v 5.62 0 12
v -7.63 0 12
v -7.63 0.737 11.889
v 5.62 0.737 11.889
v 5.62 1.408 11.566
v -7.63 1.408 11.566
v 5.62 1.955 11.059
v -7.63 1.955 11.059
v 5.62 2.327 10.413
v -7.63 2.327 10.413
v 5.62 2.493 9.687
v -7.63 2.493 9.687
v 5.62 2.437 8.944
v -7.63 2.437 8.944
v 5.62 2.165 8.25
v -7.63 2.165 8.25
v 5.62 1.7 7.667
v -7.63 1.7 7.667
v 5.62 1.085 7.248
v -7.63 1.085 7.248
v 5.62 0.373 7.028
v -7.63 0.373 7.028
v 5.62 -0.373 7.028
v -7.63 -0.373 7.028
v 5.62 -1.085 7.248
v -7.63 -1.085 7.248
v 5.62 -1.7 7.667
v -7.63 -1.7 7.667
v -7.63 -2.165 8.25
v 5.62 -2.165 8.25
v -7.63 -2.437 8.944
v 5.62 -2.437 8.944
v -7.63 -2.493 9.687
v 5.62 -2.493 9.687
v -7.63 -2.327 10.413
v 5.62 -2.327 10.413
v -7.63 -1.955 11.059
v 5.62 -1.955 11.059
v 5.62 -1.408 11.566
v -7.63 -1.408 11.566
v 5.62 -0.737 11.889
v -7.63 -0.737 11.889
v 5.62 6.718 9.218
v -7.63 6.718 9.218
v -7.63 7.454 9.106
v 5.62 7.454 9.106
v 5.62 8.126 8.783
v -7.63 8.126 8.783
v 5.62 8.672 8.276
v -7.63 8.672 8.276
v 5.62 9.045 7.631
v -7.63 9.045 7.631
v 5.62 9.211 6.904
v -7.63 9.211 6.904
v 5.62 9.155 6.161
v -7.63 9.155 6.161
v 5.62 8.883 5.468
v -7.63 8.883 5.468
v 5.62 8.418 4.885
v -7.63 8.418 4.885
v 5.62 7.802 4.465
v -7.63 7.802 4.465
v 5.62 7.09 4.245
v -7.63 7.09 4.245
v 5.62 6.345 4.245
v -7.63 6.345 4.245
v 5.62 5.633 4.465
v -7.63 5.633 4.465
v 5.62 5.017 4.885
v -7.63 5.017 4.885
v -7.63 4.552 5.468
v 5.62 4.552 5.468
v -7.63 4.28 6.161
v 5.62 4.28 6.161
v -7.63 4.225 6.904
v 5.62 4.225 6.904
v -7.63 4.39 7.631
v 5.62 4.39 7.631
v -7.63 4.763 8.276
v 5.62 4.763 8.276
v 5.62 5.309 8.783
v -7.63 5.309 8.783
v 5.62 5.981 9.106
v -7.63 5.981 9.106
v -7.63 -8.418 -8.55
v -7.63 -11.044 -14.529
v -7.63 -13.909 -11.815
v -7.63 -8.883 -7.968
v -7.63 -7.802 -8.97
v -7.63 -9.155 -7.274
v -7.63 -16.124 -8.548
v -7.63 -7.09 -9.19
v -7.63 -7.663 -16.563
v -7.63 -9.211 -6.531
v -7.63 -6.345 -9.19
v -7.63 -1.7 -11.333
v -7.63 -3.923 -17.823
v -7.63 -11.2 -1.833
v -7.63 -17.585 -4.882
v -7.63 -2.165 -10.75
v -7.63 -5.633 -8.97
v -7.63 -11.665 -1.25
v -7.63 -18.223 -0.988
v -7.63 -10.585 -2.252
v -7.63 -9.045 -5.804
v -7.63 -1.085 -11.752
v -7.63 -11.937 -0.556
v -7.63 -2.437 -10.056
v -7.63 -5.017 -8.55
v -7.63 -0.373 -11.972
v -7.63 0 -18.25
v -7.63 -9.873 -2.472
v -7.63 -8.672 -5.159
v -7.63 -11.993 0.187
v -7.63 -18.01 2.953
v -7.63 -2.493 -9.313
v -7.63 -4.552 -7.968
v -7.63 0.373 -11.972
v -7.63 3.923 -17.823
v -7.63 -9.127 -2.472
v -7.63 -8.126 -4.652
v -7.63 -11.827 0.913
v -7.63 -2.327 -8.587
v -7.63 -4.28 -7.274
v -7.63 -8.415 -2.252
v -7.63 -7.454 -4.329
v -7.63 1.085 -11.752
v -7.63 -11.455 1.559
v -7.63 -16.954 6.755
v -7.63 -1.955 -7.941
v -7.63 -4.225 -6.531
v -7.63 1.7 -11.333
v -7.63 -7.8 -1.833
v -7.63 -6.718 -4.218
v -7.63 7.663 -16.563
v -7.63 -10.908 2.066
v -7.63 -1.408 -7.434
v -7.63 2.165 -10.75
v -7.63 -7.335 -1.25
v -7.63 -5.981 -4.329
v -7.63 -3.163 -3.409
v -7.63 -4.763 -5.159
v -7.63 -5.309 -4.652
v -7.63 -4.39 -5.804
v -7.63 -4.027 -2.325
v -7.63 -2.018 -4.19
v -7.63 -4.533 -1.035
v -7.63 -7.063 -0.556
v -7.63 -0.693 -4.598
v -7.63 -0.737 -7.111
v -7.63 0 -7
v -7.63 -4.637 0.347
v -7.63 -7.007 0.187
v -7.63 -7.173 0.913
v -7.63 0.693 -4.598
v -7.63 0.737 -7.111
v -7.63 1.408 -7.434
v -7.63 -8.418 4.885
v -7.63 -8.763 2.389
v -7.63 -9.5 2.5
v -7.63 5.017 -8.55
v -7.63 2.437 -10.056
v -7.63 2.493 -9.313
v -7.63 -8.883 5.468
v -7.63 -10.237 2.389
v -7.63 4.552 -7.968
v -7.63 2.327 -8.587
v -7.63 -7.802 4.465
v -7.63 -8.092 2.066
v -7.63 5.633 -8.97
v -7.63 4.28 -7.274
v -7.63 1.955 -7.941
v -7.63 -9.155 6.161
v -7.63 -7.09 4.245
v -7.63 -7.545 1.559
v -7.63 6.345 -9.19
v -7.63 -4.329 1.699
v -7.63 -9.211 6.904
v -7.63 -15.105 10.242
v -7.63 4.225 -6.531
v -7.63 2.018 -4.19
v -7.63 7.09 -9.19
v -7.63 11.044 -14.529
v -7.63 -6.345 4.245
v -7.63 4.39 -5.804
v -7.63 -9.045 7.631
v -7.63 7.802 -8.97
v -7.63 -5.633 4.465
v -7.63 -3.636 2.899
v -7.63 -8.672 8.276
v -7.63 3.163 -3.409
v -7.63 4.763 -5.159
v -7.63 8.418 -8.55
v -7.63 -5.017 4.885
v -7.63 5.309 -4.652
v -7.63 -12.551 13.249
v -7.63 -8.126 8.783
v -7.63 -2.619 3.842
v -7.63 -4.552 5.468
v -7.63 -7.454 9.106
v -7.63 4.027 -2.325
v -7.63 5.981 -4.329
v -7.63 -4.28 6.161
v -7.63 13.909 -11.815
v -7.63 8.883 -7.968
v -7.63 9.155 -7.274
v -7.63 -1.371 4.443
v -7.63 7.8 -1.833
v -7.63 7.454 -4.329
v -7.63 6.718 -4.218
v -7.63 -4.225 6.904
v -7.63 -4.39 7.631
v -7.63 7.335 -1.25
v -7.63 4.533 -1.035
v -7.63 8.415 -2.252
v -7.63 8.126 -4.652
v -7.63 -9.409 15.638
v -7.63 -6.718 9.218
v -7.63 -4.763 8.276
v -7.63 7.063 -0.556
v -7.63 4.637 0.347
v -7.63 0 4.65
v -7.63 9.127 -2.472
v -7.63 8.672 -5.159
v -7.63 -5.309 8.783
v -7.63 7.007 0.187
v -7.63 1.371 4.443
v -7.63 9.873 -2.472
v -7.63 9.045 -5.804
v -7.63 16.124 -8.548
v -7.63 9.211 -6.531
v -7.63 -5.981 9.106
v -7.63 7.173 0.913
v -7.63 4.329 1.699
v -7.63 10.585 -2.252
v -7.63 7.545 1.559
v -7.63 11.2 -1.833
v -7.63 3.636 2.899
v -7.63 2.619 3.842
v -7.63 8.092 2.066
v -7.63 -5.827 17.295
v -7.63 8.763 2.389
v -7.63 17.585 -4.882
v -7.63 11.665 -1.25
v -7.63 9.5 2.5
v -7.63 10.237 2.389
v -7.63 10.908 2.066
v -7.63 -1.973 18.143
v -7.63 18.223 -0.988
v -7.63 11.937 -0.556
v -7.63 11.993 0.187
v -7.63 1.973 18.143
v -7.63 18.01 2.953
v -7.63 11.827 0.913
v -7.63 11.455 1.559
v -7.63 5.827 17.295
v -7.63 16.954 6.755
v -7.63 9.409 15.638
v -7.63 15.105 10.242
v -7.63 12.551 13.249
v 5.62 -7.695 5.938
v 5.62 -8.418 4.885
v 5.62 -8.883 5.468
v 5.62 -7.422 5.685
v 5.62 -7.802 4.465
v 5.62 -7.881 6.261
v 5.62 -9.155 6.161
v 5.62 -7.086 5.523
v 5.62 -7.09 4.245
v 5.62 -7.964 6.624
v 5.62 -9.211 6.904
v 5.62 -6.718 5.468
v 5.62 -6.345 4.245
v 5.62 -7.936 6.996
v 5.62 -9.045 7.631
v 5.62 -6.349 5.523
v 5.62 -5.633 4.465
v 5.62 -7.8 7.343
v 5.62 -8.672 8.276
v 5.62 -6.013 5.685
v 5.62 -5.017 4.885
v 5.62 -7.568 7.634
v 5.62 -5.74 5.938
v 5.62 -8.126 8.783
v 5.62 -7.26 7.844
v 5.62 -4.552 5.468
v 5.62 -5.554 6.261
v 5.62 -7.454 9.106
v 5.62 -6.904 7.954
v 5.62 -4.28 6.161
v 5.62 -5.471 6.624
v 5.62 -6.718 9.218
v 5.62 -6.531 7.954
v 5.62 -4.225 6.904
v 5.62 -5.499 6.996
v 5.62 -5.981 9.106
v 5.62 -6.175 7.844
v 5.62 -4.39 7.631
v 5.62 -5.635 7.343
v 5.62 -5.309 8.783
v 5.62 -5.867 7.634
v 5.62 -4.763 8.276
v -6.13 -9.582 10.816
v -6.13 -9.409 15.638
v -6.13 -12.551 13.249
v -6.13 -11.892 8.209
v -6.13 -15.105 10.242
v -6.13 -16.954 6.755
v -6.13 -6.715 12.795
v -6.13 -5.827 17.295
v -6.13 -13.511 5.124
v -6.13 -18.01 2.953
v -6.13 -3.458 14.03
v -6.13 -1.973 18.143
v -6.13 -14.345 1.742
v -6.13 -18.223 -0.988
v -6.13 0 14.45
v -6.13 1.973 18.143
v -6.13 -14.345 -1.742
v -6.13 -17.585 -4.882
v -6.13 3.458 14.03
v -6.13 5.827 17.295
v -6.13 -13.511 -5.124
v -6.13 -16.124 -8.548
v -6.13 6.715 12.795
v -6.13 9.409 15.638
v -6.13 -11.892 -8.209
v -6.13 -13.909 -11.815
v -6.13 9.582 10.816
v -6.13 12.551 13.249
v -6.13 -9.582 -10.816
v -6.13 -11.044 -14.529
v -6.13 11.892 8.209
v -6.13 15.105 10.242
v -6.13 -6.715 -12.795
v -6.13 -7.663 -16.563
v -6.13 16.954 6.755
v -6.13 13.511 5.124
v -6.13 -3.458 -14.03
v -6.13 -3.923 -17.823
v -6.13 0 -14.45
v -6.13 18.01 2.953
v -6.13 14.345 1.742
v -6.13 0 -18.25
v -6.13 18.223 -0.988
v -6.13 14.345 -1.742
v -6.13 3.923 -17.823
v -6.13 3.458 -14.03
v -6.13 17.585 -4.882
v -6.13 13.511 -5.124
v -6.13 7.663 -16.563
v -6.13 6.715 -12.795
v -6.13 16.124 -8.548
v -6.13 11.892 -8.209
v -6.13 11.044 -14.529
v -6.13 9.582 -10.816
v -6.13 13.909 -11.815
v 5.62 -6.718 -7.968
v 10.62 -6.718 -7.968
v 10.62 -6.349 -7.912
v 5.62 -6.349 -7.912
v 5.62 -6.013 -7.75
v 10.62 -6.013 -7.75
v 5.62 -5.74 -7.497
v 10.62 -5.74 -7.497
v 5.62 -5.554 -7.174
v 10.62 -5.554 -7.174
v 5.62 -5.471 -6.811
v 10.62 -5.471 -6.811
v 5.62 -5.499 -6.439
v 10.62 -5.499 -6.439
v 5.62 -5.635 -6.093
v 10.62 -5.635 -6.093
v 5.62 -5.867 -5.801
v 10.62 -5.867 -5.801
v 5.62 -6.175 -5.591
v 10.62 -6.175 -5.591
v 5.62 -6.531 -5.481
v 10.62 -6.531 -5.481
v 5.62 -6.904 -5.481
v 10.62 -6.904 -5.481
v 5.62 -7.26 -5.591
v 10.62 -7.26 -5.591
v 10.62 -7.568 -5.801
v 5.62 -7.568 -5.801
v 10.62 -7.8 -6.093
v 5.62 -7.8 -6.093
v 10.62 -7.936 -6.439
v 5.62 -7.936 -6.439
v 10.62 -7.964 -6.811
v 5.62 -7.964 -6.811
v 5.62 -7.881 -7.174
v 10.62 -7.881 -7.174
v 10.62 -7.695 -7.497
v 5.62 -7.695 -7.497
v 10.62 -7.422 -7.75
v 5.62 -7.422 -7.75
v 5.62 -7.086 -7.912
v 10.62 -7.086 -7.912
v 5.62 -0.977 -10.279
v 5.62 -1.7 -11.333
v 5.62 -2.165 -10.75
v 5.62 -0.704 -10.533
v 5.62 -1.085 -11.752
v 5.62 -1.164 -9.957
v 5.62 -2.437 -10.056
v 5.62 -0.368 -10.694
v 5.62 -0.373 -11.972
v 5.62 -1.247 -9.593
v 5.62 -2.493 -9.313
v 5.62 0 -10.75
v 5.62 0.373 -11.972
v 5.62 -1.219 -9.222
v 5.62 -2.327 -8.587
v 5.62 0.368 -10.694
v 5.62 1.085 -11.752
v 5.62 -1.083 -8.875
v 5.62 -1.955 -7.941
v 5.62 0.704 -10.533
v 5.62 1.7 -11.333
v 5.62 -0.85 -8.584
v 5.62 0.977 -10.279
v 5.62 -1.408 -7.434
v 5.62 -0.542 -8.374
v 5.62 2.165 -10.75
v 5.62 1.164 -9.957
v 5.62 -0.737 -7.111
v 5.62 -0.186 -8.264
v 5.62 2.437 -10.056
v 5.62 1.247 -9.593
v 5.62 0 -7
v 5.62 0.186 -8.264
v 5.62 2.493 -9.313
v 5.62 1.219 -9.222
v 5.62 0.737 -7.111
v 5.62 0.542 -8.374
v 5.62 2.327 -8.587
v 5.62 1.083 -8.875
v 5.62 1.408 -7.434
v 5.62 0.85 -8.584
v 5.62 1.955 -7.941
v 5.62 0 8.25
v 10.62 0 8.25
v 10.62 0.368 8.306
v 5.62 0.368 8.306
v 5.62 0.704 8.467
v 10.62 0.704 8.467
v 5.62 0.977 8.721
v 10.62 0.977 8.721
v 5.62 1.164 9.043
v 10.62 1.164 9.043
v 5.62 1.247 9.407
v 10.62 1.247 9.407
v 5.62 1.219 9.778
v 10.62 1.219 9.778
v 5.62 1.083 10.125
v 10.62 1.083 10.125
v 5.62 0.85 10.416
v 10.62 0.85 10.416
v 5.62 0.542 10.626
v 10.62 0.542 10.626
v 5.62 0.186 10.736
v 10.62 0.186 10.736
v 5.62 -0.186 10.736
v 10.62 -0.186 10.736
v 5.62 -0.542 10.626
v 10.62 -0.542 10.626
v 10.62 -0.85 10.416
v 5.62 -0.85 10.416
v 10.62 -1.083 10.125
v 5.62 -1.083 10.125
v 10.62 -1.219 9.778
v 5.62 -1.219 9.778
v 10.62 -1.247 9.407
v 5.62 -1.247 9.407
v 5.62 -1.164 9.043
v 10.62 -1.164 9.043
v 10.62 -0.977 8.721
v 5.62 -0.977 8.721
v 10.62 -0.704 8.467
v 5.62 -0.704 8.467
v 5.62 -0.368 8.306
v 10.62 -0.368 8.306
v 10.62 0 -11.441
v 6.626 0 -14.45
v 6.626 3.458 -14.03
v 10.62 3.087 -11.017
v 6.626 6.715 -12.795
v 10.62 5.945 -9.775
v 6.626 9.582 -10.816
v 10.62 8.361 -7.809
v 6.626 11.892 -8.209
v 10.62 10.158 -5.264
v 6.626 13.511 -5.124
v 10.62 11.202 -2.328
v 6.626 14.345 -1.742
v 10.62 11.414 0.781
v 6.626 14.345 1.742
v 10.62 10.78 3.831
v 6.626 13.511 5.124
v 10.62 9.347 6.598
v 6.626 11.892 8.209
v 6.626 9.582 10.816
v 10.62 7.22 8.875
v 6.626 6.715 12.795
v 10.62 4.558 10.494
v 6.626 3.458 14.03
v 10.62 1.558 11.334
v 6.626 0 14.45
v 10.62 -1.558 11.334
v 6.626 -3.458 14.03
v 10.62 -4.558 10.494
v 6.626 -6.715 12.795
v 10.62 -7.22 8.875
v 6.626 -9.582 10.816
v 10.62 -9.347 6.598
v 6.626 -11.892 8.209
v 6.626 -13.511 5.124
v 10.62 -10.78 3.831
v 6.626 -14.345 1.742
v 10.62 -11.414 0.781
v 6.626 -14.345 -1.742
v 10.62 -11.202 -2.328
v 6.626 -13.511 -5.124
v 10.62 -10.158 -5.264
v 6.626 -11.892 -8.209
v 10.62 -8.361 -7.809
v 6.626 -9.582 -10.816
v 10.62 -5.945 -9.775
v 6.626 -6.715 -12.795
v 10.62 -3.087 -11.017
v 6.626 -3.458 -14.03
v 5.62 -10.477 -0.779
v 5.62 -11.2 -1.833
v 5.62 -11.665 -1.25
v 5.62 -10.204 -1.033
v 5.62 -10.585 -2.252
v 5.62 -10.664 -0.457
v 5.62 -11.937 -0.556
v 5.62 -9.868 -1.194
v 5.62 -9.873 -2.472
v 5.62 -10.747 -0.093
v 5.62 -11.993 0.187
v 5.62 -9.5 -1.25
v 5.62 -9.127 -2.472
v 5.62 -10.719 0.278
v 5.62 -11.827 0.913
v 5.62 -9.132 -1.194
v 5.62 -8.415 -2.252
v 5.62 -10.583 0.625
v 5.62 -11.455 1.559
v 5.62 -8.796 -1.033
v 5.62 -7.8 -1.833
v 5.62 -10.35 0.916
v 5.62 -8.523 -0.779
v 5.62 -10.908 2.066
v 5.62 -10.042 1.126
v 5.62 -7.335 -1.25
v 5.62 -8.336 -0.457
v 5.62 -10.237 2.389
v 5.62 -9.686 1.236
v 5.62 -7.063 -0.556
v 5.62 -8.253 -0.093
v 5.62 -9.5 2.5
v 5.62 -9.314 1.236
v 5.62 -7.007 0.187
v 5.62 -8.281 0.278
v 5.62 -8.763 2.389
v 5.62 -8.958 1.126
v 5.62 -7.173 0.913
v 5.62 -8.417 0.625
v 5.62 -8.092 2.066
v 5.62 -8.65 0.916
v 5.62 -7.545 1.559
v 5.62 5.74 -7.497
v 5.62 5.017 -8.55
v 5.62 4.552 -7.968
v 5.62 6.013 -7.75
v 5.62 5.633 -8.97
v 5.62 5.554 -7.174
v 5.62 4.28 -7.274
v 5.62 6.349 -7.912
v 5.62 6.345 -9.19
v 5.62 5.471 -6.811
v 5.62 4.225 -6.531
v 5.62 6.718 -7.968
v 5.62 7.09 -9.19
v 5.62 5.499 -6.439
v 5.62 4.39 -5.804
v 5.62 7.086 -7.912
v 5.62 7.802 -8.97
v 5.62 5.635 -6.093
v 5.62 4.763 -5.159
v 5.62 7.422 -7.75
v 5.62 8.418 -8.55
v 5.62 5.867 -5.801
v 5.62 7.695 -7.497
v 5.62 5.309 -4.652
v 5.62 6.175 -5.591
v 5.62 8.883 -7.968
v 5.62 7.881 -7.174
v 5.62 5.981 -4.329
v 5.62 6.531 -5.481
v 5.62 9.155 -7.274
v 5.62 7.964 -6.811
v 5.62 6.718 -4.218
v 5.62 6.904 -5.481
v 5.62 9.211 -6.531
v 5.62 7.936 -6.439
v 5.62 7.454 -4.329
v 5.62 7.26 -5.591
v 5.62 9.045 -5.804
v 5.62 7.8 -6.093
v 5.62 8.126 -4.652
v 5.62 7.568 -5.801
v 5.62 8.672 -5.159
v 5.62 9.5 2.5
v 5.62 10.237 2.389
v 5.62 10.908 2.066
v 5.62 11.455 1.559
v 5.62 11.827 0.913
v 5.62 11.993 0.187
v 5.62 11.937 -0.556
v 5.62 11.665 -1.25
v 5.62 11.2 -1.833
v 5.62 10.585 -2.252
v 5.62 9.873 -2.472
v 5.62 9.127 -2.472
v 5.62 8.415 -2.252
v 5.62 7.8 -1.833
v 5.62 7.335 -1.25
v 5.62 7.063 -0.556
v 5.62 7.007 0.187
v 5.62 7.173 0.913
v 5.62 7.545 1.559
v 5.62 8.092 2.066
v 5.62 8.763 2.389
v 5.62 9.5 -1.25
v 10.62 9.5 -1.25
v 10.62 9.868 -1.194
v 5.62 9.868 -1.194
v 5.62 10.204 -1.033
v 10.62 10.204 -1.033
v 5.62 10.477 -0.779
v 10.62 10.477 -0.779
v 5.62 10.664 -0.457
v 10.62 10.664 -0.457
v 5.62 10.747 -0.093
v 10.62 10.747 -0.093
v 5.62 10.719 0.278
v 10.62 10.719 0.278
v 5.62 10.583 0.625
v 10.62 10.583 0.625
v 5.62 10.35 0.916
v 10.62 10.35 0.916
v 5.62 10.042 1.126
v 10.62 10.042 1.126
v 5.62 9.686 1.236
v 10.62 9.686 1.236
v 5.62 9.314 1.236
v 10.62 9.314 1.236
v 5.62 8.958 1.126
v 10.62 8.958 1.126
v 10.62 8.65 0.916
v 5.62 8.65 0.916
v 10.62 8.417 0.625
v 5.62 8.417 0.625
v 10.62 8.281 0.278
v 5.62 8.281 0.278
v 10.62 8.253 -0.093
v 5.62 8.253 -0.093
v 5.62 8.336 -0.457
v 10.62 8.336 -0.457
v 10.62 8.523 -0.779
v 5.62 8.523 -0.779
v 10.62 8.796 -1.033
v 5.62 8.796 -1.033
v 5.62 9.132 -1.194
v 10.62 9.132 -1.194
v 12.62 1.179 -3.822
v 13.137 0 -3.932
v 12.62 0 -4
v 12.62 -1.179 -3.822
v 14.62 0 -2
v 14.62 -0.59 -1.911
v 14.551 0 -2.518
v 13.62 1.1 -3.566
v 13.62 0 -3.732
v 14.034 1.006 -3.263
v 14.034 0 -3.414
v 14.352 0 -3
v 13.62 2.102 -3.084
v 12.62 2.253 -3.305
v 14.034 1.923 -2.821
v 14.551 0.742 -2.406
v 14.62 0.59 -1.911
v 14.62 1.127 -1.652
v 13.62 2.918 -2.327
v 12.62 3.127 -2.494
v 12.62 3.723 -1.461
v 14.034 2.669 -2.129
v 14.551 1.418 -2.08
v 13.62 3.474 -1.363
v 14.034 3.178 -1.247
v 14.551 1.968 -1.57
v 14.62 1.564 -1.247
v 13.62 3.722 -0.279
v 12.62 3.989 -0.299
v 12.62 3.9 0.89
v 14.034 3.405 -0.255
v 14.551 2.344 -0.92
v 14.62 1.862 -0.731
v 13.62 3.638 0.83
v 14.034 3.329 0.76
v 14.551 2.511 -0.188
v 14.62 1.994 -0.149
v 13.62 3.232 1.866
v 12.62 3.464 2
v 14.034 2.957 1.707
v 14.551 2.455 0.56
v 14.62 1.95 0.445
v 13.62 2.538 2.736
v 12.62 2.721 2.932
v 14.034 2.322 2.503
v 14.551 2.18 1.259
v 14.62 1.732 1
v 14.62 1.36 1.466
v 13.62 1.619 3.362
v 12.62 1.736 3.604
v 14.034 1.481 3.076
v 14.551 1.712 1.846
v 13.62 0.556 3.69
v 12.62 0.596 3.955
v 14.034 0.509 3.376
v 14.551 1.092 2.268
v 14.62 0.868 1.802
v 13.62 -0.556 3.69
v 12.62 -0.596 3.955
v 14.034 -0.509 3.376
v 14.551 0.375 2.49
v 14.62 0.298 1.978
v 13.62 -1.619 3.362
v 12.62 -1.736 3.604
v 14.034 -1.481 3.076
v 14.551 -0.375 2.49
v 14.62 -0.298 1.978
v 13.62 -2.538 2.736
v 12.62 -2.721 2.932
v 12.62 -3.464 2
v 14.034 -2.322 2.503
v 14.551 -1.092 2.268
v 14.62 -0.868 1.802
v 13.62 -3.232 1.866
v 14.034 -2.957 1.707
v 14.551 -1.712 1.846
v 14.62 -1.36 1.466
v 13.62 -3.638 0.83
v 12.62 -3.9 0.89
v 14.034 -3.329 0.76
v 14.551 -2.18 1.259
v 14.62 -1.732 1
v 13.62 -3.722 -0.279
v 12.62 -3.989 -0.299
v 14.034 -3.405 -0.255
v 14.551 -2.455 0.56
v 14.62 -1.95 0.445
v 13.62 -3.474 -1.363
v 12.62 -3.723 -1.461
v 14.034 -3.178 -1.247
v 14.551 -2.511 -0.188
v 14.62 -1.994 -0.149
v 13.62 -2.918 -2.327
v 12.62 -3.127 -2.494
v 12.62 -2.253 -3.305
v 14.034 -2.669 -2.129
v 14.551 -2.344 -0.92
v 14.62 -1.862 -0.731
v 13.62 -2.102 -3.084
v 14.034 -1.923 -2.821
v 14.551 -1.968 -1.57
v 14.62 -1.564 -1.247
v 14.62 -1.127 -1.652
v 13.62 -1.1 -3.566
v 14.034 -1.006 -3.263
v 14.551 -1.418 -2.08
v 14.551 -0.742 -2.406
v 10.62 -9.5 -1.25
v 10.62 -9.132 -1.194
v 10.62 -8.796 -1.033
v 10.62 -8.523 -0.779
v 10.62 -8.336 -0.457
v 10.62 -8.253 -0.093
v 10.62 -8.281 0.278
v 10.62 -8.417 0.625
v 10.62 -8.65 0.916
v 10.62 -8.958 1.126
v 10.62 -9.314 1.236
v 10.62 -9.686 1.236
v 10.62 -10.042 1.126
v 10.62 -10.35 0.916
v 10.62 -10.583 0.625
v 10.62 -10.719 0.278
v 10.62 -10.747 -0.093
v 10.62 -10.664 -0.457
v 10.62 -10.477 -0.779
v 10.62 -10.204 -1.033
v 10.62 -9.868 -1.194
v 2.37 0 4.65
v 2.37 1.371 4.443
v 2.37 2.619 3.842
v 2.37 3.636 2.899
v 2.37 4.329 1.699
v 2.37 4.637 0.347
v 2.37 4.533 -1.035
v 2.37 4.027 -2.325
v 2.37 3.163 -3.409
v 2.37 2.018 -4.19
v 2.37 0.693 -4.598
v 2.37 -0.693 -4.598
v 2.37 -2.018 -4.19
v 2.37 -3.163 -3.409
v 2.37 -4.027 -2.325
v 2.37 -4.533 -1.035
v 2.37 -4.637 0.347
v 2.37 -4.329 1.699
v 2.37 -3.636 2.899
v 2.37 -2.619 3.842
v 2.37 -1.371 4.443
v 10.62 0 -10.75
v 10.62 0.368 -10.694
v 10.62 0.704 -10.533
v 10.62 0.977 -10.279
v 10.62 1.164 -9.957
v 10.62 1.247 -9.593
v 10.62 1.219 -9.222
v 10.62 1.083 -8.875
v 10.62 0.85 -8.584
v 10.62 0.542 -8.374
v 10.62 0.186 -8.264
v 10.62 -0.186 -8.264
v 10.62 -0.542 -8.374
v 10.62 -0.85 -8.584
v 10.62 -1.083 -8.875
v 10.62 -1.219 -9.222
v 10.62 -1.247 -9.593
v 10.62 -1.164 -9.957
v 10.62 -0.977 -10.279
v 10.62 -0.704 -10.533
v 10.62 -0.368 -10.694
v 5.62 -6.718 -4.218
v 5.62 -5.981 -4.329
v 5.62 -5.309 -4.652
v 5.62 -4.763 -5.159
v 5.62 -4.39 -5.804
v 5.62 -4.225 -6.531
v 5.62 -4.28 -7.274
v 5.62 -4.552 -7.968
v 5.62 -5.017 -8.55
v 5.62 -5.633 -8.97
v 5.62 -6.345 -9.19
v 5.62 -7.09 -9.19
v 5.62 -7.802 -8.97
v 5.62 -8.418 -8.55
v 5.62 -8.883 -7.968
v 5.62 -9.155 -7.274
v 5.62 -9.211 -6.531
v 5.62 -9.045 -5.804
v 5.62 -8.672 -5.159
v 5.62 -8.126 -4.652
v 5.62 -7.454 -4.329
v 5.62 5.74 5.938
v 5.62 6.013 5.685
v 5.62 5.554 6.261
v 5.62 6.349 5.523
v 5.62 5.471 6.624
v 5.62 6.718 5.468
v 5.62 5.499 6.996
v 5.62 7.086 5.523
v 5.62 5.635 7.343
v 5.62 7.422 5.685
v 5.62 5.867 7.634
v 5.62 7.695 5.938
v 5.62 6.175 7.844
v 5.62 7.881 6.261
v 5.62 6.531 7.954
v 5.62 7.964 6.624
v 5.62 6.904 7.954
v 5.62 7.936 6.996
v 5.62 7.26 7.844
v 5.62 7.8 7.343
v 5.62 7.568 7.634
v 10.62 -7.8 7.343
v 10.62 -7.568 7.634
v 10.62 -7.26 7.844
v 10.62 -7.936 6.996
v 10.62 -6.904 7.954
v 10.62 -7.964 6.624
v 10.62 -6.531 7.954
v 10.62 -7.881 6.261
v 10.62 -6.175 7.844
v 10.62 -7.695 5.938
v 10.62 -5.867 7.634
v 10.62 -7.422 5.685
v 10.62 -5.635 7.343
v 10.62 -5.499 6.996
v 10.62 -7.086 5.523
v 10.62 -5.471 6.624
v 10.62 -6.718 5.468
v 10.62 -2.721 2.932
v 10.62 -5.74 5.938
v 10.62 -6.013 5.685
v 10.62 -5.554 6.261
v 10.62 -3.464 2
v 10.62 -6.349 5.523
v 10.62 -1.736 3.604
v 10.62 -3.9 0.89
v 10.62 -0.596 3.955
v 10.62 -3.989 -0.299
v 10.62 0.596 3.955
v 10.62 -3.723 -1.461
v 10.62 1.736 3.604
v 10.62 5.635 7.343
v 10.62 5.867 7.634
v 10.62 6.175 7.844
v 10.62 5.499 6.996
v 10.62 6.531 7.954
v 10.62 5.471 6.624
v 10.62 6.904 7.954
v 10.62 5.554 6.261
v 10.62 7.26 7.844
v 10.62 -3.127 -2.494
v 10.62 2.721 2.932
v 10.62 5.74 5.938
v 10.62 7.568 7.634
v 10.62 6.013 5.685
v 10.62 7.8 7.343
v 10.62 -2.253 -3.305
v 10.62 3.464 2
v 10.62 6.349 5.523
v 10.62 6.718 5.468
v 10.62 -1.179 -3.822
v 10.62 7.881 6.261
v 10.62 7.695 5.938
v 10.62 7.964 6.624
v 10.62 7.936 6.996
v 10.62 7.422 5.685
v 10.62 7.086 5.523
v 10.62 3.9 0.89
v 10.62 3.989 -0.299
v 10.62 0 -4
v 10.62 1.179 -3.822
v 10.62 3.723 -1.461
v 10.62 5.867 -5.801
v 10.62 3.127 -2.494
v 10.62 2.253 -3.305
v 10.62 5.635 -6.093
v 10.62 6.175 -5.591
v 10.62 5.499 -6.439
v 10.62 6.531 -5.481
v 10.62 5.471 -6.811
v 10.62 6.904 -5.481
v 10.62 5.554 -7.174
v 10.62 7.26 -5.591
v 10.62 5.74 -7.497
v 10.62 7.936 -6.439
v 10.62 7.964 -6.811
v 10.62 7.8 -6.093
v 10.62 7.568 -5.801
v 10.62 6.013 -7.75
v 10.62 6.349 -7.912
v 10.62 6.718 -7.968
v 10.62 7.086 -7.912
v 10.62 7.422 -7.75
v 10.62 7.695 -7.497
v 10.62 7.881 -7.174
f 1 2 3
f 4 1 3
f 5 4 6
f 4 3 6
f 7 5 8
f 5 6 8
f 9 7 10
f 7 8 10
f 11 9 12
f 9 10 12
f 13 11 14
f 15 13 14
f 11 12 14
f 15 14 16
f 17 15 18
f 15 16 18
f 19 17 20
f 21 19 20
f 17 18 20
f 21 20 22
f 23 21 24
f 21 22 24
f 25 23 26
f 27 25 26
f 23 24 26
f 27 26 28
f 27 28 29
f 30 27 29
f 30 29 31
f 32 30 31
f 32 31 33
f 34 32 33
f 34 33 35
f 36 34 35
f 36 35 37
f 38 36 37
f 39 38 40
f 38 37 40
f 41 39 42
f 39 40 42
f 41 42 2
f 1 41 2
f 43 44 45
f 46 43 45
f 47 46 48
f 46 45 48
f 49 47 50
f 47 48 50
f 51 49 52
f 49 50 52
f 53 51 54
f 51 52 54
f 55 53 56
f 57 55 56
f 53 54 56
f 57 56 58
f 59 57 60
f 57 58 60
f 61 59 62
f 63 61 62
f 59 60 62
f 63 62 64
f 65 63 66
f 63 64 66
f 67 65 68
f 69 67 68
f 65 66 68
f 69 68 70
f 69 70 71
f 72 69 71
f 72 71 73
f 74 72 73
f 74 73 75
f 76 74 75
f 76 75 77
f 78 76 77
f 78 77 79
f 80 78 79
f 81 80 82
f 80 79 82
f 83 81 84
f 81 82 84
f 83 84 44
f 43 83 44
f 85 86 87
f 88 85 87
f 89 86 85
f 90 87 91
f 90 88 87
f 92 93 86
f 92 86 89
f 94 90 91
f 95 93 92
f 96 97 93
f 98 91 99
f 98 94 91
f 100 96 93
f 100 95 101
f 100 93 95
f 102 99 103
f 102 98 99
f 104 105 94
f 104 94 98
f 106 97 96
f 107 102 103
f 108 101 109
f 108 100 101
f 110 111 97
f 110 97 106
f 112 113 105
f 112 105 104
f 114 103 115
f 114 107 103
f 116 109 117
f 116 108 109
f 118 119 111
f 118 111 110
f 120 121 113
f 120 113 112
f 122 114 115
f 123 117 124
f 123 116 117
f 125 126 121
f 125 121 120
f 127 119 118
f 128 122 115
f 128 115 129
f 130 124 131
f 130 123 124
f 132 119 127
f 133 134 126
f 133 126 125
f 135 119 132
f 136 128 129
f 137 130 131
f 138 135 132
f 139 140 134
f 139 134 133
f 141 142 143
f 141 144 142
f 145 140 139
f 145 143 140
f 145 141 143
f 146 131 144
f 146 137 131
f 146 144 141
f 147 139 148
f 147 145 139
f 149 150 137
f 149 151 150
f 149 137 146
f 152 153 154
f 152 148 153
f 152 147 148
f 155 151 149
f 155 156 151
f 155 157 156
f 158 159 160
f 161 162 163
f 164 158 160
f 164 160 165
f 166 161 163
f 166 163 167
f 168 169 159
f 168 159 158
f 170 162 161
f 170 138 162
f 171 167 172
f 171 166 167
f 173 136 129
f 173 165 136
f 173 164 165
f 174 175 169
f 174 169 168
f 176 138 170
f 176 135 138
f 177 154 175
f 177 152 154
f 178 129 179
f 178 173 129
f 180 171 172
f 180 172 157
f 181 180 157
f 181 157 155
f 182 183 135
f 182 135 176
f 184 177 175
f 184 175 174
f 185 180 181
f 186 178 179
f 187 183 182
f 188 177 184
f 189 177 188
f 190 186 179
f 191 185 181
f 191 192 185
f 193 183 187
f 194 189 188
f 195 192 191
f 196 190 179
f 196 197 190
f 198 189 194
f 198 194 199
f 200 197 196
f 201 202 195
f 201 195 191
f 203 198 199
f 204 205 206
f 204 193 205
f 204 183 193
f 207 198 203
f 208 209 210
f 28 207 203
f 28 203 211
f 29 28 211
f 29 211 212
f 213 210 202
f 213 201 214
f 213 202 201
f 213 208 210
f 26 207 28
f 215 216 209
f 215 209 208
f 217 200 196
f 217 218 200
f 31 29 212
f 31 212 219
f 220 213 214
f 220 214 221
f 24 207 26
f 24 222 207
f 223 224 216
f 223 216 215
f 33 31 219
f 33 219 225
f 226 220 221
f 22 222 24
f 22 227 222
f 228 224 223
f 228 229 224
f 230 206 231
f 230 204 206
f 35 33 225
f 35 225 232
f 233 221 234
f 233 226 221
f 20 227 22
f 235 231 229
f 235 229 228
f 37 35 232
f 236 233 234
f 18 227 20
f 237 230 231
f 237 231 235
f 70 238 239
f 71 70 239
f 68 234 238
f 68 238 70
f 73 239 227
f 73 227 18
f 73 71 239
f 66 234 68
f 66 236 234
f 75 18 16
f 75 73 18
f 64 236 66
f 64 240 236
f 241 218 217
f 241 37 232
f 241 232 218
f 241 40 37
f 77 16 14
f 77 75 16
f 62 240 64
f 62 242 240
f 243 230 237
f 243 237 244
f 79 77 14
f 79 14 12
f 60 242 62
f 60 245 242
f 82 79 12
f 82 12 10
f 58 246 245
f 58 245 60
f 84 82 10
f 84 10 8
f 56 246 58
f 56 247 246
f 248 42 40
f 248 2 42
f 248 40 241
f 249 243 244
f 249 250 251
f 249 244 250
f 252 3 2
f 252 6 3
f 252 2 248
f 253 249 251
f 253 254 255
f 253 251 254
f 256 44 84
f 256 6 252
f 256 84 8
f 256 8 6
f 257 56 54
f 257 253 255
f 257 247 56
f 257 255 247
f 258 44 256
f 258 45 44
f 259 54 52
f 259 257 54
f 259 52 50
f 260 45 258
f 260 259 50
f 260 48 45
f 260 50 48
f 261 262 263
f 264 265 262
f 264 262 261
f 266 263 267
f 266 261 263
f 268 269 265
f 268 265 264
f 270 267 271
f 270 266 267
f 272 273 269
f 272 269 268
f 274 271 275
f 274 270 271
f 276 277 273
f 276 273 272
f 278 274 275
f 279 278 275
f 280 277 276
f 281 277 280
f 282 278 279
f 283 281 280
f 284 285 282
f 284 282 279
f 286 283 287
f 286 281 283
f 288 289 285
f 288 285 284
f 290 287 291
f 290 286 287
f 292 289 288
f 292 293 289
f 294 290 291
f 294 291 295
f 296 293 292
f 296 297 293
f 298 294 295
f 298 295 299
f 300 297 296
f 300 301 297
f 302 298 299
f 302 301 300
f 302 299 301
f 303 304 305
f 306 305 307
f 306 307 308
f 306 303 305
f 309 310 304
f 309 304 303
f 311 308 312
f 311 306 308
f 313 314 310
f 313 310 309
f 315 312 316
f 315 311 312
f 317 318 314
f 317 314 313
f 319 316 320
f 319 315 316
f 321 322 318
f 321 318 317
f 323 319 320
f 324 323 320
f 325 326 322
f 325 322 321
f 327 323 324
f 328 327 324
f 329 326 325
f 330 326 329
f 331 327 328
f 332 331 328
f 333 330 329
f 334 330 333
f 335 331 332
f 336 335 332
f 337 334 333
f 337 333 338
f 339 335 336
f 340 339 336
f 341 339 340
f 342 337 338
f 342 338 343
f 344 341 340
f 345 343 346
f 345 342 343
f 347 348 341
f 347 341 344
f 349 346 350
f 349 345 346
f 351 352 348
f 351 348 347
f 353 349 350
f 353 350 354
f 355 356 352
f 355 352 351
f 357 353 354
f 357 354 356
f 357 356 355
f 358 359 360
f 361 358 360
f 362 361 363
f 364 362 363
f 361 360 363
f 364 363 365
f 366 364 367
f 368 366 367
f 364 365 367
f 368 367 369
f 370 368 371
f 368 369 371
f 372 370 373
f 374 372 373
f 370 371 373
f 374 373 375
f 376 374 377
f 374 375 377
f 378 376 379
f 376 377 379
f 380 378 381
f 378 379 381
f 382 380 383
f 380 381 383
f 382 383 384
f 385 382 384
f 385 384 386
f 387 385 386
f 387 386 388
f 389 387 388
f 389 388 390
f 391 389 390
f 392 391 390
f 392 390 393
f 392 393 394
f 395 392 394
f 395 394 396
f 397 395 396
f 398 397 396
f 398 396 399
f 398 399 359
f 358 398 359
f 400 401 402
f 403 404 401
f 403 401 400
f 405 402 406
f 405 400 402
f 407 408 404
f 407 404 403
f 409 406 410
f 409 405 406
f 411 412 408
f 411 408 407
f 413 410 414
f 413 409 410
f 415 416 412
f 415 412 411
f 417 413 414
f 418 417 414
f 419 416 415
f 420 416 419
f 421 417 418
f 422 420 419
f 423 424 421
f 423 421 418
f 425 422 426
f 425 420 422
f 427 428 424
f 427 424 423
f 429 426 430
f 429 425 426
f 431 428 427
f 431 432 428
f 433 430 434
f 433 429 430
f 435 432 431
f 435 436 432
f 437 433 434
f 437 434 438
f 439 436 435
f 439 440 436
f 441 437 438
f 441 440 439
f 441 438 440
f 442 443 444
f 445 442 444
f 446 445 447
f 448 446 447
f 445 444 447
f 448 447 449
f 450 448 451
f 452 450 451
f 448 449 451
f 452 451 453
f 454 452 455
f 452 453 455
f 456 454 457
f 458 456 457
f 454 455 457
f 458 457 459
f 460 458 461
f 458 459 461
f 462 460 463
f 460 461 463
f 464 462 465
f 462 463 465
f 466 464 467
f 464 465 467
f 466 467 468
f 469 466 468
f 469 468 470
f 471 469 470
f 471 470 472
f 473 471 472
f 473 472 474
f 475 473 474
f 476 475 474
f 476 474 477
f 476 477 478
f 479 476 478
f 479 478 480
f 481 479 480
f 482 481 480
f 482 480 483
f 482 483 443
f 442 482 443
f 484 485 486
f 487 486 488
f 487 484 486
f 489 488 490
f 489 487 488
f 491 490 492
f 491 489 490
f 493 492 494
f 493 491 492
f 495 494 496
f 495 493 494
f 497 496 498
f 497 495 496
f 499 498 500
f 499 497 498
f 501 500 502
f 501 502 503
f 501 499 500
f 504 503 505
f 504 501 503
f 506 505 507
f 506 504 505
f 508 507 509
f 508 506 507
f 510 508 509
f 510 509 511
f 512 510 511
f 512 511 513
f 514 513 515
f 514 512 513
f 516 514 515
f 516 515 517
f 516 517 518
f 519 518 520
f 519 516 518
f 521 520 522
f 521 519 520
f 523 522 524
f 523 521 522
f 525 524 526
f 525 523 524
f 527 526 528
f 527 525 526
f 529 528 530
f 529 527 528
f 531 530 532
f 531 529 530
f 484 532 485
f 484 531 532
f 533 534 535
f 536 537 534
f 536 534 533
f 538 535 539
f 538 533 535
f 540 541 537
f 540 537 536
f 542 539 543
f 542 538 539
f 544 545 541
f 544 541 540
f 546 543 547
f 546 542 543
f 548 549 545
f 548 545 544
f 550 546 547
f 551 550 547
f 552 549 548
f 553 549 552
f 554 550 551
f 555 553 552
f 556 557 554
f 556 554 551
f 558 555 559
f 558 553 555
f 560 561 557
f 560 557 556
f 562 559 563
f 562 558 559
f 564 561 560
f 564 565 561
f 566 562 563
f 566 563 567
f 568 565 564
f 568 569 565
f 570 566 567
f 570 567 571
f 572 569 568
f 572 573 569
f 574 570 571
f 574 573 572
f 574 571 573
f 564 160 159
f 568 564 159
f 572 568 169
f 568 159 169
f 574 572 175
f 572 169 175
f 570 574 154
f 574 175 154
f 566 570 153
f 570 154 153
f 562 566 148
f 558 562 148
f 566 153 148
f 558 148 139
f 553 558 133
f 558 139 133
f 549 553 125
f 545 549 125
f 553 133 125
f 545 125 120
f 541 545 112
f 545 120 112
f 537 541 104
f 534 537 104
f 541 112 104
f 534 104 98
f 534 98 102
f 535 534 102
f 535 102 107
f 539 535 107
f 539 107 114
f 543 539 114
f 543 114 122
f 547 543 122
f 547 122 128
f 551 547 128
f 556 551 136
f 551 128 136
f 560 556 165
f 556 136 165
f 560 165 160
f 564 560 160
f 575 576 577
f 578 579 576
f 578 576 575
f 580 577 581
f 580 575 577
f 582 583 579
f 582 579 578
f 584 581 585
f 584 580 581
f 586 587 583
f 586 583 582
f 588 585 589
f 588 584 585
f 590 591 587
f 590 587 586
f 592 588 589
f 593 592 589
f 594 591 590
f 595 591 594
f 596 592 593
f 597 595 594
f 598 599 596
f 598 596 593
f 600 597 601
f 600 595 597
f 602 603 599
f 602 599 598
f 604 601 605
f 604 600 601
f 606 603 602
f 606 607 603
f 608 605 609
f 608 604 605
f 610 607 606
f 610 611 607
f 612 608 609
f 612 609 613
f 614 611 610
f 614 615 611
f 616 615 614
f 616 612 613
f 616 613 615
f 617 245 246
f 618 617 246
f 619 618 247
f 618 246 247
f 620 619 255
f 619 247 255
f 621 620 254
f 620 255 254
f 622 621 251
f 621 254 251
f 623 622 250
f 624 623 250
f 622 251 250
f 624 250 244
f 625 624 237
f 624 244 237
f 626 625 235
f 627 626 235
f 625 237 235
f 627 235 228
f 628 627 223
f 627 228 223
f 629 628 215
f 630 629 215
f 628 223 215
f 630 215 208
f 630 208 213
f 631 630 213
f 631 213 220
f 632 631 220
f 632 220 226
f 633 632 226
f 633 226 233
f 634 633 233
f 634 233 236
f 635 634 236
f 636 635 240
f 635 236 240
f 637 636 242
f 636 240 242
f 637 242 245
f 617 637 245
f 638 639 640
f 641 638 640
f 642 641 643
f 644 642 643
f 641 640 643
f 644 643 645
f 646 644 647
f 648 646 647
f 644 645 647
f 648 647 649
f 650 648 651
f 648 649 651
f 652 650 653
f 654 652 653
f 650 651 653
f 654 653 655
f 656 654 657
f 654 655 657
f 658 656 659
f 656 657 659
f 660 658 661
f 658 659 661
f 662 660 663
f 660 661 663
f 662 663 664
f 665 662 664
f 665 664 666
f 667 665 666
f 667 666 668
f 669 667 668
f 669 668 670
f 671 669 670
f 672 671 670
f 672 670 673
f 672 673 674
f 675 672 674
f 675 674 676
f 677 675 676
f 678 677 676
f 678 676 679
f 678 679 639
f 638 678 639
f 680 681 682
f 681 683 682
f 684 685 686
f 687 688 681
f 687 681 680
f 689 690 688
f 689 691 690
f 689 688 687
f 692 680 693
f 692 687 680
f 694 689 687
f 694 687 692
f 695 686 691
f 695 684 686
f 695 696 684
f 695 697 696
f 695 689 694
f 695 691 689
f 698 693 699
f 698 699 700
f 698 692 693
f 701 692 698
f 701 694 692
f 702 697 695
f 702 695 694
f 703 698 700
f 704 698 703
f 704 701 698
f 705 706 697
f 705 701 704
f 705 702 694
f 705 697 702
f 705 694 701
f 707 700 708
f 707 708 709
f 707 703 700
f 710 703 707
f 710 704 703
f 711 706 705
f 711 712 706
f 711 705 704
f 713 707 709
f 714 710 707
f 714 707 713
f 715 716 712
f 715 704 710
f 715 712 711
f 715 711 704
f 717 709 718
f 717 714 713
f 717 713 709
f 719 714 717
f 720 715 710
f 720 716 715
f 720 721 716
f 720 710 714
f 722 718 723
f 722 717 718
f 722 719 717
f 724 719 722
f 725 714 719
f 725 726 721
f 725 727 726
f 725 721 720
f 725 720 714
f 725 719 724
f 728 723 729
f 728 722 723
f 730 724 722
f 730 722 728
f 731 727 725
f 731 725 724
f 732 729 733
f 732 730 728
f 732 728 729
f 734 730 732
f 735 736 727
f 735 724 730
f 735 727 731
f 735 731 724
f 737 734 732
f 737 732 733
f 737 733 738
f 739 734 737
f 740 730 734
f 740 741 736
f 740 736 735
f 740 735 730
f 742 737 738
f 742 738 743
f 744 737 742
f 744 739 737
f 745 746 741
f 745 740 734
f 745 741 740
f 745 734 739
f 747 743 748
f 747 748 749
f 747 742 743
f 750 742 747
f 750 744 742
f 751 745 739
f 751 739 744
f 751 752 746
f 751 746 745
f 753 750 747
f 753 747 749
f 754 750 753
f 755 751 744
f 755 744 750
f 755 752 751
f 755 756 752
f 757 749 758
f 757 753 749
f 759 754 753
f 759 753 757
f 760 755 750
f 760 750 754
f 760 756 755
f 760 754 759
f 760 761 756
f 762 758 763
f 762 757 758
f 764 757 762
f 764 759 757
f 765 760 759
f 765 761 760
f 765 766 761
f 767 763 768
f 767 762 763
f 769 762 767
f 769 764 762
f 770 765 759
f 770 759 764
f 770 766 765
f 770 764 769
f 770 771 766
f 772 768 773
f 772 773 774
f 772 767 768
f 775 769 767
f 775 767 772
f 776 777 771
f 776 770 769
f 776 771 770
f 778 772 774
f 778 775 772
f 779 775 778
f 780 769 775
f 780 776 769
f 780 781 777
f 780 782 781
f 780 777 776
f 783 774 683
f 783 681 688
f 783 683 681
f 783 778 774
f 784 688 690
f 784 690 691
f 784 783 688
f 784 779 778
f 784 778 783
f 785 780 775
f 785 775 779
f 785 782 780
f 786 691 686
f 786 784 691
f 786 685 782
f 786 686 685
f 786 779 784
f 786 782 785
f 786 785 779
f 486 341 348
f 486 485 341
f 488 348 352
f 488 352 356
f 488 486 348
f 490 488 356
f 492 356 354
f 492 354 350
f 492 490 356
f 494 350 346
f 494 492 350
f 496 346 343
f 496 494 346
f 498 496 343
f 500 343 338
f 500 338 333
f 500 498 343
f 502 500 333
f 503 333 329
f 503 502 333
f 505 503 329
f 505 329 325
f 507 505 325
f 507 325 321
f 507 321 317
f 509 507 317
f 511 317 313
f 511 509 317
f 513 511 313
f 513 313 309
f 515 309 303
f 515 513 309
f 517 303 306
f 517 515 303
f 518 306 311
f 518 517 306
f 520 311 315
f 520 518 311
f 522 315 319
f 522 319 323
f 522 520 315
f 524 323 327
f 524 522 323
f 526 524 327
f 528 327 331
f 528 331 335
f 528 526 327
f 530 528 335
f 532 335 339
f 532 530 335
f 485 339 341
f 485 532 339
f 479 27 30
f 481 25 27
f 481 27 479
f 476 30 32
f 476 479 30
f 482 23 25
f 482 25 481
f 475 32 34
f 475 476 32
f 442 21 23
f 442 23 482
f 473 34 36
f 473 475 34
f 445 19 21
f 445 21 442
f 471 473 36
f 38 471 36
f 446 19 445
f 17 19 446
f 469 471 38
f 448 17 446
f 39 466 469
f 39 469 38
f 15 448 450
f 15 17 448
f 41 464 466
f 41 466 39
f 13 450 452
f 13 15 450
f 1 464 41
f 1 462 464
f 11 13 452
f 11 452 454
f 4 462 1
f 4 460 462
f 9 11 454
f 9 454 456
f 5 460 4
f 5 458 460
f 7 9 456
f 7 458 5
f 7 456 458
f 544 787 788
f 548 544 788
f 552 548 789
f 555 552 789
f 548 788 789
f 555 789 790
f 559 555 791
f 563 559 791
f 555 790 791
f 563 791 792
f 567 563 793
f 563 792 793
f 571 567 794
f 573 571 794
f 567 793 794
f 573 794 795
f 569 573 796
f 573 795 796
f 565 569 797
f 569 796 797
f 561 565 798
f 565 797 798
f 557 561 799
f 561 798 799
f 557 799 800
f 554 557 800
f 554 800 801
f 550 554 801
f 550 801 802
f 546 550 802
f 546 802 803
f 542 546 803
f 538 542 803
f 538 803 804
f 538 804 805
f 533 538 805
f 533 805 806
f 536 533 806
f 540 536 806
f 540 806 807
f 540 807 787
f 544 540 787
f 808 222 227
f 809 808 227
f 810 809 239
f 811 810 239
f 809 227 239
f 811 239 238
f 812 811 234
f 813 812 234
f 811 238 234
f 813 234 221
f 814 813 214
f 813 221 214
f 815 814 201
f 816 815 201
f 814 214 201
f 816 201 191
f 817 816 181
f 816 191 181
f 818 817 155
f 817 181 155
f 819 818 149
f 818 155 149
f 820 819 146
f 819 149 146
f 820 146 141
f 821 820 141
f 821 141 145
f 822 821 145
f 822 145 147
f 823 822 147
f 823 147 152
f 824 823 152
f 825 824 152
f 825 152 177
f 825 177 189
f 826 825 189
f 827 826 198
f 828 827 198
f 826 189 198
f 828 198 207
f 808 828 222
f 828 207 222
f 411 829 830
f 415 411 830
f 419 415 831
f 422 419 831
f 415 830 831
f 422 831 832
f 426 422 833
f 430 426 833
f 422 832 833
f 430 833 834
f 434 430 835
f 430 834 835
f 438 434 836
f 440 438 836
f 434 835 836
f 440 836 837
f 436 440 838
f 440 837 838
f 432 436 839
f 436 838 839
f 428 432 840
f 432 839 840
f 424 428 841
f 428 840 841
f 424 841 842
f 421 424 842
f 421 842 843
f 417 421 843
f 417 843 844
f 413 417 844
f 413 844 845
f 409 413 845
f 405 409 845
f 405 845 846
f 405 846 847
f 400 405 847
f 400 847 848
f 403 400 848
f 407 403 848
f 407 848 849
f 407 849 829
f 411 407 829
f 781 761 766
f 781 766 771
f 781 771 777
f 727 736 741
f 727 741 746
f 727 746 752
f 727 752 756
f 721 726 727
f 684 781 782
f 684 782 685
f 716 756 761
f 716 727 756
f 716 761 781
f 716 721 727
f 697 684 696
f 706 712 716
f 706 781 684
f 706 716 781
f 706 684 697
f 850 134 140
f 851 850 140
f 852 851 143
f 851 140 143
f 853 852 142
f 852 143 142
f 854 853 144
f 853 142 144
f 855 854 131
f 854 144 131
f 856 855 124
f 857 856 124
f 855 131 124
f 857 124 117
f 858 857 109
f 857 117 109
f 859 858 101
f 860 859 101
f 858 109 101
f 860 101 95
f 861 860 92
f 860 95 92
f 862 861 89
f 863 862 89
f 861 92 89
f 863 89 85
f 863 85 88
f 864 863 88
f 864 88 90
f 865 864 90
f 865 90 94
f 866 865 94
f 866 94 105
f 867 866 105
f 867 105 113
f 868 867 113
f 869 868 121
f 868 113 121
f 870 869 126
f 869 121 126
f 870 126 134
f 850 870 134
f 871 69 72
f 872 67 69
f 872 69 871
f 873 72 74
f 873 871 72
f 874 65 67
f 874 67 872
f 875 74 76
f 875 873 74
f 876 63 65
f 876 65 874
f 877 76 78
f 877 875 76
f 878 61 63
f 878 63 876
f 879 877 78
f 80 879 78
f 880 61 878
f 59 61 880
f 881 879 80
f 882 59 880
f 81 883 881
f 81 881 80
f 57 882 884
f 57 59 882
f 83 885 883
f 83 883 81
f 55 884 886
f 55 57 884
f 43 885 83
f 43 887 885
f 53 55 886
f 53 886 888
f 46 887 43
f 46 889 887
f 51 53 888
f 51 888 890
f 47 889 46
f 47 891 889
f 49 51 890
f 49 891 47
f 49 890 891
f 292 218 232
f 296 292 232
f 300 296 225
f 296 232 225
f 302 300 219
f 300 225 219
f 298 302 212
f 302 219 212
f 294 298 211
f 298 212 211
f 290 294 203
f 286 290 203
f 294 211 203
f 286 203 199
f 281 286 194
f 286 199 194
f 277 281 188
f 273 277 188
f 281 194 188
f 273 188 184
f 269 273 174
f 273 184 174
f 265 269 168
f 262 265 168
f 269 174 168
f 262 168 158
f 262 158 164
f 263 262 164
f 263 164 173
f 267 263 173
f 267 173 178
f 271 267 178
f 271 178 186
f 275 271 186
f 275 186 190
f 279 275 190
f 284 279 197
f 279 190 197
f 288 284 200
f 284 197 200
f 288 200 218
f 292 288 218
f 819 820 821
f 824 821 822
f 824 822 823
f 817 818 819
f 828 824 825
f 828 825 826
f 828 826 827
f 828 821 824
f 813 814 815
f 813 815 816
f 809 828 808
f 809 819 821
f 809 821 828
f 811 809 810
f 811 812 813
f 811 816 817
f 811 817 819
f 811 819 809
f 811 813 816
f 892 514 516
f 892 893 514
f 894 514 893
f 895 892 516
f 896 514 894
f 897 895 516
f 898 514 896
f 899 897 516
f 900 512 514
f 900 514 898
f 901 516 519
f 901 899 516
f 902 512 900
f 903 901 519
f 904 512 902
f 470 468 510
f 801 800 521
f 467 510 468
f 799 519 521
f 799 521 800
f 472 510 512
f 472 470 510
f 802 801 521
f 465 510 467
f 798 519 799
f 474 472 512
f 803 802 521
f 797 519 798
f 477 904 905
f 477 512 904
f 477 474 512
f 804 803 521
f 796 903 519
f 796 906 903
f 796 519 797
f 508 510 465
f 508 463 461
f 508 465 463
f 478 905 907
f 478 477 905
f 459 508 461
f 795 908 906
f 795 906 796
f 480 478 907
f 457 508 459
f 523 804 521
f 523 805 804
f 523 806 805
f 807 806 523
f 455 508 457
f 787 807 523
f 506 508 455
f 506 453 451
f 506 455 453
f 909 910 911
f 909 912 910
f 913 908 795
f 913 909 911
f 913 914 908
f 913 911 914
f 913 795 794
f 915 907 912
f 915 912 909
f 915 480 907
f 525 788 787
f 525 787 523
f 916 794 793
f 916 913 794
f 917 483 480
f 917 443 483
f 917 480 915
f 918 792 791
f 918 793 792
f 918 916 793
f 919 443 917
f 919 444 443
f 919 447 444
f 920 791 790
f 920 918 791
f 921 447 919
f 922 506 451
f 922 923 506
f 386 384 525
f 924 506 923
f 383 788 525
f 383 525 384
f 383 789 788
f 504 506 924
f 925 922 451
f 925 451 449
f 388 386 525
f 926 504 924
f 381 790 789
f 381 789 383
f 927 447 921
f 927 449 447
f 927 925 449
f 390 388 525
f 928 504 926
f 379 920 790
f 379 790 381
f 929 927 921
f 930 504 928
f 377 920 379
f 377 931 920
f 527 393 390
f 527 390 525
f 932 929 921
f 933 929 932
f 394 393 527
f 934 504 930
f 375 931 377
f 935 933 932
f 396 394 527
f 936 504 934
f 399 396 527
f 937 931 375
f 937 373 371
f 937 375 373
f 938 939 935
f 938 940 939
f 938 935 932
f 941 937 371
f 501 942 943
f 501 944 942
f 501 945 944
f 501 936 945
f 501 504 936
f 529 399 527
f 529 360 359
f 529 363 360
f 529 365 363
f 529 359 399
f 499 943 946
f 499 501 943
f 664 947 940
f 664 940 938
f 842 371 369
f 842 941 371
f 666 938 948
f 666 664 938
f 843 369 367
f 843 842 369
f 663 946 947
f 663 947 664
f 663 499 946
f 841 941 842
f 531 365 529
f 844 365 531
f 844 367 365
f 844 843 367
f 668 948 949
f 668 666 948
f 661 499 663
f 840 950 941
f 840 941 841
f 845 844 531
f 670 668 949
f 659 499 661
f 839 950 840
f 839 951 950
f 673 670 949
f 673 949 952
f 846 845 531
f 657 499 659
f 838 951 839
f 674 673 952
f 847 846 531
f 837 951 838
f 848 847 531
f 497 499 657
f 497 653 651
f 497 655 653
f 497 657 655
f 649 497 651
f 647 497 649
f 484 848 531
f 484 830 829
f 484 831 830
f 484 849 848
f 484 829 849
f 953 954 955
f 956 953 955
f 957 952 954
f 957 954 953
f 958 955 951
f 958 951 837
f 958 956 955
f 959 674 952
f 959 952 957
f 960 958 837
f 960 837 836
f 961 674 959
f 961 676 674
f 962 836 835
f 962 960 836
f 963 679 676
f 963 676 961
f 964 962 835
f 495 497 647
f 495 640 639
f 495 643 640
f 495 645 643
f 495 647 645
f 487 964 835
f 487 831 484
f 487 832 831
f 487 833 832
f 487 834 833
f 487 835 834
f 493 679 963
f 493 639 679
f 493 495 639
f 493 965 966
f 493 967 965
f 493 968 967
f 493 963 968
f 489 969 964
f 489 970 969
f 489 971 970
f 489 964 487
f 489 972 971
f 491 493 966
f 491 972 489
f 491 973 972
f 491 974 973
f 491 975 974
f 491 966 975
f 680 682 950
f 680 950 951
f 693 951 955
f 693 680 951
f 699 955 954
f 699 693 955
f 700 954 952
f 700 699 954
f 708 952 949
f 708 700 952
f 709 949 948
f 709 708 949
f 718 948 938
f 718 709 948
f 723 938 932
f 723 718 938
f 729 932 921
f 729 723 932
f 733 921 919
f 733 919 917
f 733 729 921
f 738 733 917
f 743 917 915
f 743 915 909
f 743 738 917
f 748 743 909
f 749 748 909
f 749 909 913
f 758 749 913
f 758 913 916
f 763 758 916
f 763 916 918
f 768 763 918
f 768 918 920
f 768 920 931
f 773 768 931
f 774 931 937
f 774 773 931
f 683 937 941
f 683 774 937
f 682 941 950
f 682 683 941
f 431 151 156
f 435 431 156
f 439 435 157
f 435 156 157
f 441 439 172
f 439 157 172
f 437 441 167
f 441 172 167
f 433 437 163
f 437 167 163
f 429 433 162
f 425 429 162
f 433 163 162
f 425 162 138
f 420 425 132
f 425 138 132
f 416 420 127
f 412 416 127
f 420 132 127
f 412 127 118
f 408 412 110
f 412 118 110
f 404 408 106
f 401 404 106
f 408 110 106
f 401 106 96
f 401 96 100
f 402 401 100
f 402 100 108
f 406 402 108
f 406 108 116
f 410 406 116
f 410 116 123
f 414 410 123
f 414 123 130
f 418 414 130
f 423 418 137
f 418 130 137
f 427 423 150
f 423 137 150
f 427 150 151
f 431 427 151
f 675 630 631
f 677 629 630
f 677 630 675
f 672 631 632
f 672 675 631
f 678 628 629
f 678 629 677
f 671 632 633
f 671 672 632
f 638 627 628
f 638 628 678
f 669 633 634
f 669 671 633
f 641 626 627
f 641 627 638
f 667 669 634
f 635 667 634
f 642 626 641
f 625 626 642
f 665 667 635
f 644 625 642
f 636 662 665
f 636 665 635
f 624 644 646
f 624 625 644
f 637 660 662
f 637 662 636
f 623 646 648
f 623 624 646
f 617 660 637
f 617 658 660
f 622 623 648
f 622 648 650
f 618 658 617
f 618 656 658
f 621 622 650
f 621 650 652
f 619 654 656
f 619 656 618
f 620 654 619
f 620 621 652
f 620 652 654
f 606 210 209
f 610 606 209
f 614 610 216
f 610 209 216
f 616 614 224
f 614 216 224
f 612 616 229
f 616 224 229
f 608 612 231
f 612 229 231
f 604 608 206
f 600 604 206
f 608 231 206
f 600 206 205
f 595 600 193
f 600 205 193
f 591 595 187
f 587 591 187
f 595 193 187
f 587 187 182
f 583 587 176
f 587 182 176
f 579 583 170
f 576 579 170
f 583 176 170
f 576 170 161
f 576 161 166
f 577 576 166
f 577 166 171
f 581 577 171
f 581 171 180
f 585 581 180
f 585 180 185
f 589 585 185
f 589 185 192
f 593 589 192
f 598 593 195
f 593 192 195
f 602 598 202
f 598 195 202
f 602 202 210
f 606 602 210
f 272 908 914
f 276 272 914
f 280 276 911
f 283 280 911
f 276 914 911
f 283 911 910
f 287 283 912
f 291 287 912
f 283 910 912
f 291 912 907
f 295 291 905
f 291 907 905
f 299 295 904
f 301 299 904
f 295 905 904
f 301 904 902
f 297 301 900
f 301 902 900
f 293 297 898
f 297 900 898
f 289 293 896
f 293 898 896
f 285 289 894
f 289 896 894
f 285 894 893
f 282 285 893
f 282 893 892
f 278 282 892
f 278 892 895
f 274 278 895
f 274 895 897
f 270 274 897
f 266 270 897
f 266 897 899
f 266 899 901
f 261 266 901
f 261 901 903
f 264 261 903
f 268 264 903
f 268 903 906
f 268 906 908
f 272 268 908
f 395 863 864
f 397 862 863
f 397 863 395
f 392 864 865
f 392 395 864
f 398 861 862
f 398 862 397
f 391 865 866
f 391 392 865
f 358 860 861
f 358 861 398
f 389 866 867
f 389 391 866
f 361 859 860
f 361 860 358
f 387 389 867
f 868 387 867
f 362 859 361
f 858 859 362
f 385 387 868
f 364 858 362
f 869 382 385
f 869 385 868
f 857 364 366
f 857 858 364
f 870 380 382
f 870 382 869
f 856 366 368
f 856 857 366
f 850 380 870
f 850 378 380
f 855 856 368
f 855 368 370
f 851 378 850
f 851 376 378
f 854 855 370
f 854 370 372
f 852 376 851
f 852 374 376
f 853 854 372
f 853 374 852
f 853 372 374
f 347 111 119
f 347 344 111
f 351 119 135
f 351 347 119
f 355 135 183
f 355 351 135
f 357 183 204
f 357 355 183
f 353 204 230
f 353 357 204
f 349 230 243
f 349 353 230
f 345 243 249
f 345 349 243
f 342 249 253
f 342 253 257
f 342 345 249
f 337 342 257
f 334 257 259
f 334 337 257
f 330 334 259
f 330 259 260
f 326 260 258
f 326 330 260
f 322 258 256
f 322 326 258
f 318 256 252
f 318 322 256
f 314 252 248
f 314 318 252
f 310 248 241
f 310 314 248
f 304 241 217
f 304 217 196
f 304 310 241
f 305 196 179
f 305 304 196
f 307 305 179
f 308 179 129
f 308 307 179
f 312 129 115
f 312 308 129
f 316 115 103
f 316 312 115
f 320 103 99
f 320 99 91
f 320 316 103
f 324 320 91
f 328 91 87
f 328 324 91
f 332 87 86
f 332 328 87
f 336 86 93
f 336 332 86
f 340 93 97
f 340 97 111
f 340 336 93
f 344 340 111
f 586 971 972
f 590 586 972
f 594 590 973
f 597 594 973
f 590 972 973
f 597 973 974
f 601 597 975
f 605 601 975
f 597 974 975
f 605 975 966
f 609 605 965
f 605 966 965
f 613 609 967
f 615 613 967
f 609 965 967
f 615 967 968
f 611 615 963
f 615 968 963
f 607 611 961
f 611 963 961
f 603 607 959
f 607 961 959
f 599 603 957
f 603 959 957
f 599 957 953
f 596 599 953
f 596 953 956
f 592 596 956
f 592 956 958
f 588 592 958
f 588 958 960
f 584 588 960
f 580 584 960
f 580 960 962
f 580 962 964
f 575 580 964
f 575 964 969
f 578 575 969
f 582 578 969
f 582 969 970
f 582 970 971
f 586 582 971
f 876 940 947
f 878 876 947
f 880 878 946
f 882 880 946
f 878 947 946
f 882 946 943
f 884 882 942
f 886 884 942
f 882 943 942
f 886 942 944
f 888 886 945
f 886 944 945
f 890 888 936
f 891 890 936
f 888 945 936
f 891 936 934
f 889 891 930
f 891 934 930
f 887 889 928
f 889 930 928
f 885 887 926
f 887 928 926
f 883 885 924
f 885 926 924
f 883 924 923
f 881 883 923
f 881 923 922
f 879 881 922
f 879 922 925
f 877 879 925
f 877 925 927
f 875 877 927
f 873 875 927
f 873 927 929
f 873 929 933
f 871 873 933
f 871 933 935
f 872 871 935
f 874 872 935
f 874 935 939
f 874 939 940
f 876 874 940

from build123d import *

# Parameters (mm, degrees)
SKETCH2_R          = 1.25
CUT_EXTRUDE1_DEPTH = 19.25
FILLET1_R          = 2
SKETCH3_R          = 2.5
CUT_EXTRUDE2_DEPTH = 13.25
SKETCH4_R          = 4.65
CUT_EXTRUDE3_DEPTH = 10


with BuildPart() as part:
    # Sketch1 → Revolve1 (revolve)
    with BuildSketch(Plane(origin=(0, 0, 0), x_dir=(1, 0, 0), z_dir=(0, 1, 0))):
        Polygon((-6.130434783, 14.45), (6.626387667, 14.45), (10.619565217, 11.440924884), (10.619565217, 4), (14.619565217, 4), (14.619565217, 0), (13.372742768, 0), (-6.130434783, 0), (-7.630434783, 0), (-7.630434783, 18.25), (-6.130434783, 18.25), align=None)
    revolve(axis=Axis((-12.391304348, 0, 0), (1, 0, 0)))

    # Sketch2 → Cut-Extrude1 (cut, through all)
    with BuildSketch(Plane(origin=(10.619565217, 0, 0), x_dir=(0, 0, -1), z_dir=(1, 0, 0))):
        with Locations((0, 9.5)):
            Circle(SKETCH2_R)
        with Locations((6.717514421, 6.717514421)):
            Circle(SKETCH2_R)
        with Locations((9.5, 0)):
            Circle(SKETCH2_R)
        with Locations((6.717514421, -6.717514421)):
            Circle(SKETCH2_R)
        with Locations((0, -9.5)):
            Circle(SKETCH2_R)
        with Locations((-6.717514421, -6.717514421)):
            Circle(SKETCH2_R)
        with Locations((-9.5, 0)):
            Circle(SKETCH2_R)
        with Locations((-6.717514421, 6.717514421)):
            Circle(SKETCH2_R)
    extrude(amount=-CUT_EXTRUDE1_DEPTH, mode=Mode.SUBTRACT)

    # Fillet1
    fillet1_edges = [part.edges().sort_by_distance(p)[0] for p in [
        (14.619565217, 0, 4),
    ]]
    fillet(fillet1_edges, radius=FILLET1_R)

    # Sketch3 → Cut-Extrude2 (cut)
    with BuildSketch(Plane.ZY.offset(7.630434783)):
        with Locations((0, 9.5)):
            Circle(SKETCH3_R)
        with Locations((6.717514421, 6.717514421)):
            Circle(SKETCH3_R)
        with Locations((9.5, 0)):
            Circle(SKETCH3_R)
        with Locations((6.717514421, -6.717514421)):
            Circle(SKETCH3_R)
        with Locations((0, -9.5)):
            Circle(SKETCH3_R)
        with Locations((-6.717514421, -6.717514421)):
            Circle(SKETCH3_R)
        with Locations((-9.5, 0)):
            Circle(SKETCH3_R)
        with Locations((-6.717514421, 6.717514421)):
            Circle(SKETCH3_R)
    extrude(amount=-CUT_EXTRUDE2_DEPTH, mode=Mode.SUBTRACT)

    # Sketch4 → Cut-Extrude3 (cut)
    with BuildSketch(Plane.ZY.offset(7.630434783)):
        Circle(SKETCH4_R)
    extrude(amount=-CUT_EXTRUDE3_DEPTH, mode=Mode.SUBTRACT)


solid = part.part
